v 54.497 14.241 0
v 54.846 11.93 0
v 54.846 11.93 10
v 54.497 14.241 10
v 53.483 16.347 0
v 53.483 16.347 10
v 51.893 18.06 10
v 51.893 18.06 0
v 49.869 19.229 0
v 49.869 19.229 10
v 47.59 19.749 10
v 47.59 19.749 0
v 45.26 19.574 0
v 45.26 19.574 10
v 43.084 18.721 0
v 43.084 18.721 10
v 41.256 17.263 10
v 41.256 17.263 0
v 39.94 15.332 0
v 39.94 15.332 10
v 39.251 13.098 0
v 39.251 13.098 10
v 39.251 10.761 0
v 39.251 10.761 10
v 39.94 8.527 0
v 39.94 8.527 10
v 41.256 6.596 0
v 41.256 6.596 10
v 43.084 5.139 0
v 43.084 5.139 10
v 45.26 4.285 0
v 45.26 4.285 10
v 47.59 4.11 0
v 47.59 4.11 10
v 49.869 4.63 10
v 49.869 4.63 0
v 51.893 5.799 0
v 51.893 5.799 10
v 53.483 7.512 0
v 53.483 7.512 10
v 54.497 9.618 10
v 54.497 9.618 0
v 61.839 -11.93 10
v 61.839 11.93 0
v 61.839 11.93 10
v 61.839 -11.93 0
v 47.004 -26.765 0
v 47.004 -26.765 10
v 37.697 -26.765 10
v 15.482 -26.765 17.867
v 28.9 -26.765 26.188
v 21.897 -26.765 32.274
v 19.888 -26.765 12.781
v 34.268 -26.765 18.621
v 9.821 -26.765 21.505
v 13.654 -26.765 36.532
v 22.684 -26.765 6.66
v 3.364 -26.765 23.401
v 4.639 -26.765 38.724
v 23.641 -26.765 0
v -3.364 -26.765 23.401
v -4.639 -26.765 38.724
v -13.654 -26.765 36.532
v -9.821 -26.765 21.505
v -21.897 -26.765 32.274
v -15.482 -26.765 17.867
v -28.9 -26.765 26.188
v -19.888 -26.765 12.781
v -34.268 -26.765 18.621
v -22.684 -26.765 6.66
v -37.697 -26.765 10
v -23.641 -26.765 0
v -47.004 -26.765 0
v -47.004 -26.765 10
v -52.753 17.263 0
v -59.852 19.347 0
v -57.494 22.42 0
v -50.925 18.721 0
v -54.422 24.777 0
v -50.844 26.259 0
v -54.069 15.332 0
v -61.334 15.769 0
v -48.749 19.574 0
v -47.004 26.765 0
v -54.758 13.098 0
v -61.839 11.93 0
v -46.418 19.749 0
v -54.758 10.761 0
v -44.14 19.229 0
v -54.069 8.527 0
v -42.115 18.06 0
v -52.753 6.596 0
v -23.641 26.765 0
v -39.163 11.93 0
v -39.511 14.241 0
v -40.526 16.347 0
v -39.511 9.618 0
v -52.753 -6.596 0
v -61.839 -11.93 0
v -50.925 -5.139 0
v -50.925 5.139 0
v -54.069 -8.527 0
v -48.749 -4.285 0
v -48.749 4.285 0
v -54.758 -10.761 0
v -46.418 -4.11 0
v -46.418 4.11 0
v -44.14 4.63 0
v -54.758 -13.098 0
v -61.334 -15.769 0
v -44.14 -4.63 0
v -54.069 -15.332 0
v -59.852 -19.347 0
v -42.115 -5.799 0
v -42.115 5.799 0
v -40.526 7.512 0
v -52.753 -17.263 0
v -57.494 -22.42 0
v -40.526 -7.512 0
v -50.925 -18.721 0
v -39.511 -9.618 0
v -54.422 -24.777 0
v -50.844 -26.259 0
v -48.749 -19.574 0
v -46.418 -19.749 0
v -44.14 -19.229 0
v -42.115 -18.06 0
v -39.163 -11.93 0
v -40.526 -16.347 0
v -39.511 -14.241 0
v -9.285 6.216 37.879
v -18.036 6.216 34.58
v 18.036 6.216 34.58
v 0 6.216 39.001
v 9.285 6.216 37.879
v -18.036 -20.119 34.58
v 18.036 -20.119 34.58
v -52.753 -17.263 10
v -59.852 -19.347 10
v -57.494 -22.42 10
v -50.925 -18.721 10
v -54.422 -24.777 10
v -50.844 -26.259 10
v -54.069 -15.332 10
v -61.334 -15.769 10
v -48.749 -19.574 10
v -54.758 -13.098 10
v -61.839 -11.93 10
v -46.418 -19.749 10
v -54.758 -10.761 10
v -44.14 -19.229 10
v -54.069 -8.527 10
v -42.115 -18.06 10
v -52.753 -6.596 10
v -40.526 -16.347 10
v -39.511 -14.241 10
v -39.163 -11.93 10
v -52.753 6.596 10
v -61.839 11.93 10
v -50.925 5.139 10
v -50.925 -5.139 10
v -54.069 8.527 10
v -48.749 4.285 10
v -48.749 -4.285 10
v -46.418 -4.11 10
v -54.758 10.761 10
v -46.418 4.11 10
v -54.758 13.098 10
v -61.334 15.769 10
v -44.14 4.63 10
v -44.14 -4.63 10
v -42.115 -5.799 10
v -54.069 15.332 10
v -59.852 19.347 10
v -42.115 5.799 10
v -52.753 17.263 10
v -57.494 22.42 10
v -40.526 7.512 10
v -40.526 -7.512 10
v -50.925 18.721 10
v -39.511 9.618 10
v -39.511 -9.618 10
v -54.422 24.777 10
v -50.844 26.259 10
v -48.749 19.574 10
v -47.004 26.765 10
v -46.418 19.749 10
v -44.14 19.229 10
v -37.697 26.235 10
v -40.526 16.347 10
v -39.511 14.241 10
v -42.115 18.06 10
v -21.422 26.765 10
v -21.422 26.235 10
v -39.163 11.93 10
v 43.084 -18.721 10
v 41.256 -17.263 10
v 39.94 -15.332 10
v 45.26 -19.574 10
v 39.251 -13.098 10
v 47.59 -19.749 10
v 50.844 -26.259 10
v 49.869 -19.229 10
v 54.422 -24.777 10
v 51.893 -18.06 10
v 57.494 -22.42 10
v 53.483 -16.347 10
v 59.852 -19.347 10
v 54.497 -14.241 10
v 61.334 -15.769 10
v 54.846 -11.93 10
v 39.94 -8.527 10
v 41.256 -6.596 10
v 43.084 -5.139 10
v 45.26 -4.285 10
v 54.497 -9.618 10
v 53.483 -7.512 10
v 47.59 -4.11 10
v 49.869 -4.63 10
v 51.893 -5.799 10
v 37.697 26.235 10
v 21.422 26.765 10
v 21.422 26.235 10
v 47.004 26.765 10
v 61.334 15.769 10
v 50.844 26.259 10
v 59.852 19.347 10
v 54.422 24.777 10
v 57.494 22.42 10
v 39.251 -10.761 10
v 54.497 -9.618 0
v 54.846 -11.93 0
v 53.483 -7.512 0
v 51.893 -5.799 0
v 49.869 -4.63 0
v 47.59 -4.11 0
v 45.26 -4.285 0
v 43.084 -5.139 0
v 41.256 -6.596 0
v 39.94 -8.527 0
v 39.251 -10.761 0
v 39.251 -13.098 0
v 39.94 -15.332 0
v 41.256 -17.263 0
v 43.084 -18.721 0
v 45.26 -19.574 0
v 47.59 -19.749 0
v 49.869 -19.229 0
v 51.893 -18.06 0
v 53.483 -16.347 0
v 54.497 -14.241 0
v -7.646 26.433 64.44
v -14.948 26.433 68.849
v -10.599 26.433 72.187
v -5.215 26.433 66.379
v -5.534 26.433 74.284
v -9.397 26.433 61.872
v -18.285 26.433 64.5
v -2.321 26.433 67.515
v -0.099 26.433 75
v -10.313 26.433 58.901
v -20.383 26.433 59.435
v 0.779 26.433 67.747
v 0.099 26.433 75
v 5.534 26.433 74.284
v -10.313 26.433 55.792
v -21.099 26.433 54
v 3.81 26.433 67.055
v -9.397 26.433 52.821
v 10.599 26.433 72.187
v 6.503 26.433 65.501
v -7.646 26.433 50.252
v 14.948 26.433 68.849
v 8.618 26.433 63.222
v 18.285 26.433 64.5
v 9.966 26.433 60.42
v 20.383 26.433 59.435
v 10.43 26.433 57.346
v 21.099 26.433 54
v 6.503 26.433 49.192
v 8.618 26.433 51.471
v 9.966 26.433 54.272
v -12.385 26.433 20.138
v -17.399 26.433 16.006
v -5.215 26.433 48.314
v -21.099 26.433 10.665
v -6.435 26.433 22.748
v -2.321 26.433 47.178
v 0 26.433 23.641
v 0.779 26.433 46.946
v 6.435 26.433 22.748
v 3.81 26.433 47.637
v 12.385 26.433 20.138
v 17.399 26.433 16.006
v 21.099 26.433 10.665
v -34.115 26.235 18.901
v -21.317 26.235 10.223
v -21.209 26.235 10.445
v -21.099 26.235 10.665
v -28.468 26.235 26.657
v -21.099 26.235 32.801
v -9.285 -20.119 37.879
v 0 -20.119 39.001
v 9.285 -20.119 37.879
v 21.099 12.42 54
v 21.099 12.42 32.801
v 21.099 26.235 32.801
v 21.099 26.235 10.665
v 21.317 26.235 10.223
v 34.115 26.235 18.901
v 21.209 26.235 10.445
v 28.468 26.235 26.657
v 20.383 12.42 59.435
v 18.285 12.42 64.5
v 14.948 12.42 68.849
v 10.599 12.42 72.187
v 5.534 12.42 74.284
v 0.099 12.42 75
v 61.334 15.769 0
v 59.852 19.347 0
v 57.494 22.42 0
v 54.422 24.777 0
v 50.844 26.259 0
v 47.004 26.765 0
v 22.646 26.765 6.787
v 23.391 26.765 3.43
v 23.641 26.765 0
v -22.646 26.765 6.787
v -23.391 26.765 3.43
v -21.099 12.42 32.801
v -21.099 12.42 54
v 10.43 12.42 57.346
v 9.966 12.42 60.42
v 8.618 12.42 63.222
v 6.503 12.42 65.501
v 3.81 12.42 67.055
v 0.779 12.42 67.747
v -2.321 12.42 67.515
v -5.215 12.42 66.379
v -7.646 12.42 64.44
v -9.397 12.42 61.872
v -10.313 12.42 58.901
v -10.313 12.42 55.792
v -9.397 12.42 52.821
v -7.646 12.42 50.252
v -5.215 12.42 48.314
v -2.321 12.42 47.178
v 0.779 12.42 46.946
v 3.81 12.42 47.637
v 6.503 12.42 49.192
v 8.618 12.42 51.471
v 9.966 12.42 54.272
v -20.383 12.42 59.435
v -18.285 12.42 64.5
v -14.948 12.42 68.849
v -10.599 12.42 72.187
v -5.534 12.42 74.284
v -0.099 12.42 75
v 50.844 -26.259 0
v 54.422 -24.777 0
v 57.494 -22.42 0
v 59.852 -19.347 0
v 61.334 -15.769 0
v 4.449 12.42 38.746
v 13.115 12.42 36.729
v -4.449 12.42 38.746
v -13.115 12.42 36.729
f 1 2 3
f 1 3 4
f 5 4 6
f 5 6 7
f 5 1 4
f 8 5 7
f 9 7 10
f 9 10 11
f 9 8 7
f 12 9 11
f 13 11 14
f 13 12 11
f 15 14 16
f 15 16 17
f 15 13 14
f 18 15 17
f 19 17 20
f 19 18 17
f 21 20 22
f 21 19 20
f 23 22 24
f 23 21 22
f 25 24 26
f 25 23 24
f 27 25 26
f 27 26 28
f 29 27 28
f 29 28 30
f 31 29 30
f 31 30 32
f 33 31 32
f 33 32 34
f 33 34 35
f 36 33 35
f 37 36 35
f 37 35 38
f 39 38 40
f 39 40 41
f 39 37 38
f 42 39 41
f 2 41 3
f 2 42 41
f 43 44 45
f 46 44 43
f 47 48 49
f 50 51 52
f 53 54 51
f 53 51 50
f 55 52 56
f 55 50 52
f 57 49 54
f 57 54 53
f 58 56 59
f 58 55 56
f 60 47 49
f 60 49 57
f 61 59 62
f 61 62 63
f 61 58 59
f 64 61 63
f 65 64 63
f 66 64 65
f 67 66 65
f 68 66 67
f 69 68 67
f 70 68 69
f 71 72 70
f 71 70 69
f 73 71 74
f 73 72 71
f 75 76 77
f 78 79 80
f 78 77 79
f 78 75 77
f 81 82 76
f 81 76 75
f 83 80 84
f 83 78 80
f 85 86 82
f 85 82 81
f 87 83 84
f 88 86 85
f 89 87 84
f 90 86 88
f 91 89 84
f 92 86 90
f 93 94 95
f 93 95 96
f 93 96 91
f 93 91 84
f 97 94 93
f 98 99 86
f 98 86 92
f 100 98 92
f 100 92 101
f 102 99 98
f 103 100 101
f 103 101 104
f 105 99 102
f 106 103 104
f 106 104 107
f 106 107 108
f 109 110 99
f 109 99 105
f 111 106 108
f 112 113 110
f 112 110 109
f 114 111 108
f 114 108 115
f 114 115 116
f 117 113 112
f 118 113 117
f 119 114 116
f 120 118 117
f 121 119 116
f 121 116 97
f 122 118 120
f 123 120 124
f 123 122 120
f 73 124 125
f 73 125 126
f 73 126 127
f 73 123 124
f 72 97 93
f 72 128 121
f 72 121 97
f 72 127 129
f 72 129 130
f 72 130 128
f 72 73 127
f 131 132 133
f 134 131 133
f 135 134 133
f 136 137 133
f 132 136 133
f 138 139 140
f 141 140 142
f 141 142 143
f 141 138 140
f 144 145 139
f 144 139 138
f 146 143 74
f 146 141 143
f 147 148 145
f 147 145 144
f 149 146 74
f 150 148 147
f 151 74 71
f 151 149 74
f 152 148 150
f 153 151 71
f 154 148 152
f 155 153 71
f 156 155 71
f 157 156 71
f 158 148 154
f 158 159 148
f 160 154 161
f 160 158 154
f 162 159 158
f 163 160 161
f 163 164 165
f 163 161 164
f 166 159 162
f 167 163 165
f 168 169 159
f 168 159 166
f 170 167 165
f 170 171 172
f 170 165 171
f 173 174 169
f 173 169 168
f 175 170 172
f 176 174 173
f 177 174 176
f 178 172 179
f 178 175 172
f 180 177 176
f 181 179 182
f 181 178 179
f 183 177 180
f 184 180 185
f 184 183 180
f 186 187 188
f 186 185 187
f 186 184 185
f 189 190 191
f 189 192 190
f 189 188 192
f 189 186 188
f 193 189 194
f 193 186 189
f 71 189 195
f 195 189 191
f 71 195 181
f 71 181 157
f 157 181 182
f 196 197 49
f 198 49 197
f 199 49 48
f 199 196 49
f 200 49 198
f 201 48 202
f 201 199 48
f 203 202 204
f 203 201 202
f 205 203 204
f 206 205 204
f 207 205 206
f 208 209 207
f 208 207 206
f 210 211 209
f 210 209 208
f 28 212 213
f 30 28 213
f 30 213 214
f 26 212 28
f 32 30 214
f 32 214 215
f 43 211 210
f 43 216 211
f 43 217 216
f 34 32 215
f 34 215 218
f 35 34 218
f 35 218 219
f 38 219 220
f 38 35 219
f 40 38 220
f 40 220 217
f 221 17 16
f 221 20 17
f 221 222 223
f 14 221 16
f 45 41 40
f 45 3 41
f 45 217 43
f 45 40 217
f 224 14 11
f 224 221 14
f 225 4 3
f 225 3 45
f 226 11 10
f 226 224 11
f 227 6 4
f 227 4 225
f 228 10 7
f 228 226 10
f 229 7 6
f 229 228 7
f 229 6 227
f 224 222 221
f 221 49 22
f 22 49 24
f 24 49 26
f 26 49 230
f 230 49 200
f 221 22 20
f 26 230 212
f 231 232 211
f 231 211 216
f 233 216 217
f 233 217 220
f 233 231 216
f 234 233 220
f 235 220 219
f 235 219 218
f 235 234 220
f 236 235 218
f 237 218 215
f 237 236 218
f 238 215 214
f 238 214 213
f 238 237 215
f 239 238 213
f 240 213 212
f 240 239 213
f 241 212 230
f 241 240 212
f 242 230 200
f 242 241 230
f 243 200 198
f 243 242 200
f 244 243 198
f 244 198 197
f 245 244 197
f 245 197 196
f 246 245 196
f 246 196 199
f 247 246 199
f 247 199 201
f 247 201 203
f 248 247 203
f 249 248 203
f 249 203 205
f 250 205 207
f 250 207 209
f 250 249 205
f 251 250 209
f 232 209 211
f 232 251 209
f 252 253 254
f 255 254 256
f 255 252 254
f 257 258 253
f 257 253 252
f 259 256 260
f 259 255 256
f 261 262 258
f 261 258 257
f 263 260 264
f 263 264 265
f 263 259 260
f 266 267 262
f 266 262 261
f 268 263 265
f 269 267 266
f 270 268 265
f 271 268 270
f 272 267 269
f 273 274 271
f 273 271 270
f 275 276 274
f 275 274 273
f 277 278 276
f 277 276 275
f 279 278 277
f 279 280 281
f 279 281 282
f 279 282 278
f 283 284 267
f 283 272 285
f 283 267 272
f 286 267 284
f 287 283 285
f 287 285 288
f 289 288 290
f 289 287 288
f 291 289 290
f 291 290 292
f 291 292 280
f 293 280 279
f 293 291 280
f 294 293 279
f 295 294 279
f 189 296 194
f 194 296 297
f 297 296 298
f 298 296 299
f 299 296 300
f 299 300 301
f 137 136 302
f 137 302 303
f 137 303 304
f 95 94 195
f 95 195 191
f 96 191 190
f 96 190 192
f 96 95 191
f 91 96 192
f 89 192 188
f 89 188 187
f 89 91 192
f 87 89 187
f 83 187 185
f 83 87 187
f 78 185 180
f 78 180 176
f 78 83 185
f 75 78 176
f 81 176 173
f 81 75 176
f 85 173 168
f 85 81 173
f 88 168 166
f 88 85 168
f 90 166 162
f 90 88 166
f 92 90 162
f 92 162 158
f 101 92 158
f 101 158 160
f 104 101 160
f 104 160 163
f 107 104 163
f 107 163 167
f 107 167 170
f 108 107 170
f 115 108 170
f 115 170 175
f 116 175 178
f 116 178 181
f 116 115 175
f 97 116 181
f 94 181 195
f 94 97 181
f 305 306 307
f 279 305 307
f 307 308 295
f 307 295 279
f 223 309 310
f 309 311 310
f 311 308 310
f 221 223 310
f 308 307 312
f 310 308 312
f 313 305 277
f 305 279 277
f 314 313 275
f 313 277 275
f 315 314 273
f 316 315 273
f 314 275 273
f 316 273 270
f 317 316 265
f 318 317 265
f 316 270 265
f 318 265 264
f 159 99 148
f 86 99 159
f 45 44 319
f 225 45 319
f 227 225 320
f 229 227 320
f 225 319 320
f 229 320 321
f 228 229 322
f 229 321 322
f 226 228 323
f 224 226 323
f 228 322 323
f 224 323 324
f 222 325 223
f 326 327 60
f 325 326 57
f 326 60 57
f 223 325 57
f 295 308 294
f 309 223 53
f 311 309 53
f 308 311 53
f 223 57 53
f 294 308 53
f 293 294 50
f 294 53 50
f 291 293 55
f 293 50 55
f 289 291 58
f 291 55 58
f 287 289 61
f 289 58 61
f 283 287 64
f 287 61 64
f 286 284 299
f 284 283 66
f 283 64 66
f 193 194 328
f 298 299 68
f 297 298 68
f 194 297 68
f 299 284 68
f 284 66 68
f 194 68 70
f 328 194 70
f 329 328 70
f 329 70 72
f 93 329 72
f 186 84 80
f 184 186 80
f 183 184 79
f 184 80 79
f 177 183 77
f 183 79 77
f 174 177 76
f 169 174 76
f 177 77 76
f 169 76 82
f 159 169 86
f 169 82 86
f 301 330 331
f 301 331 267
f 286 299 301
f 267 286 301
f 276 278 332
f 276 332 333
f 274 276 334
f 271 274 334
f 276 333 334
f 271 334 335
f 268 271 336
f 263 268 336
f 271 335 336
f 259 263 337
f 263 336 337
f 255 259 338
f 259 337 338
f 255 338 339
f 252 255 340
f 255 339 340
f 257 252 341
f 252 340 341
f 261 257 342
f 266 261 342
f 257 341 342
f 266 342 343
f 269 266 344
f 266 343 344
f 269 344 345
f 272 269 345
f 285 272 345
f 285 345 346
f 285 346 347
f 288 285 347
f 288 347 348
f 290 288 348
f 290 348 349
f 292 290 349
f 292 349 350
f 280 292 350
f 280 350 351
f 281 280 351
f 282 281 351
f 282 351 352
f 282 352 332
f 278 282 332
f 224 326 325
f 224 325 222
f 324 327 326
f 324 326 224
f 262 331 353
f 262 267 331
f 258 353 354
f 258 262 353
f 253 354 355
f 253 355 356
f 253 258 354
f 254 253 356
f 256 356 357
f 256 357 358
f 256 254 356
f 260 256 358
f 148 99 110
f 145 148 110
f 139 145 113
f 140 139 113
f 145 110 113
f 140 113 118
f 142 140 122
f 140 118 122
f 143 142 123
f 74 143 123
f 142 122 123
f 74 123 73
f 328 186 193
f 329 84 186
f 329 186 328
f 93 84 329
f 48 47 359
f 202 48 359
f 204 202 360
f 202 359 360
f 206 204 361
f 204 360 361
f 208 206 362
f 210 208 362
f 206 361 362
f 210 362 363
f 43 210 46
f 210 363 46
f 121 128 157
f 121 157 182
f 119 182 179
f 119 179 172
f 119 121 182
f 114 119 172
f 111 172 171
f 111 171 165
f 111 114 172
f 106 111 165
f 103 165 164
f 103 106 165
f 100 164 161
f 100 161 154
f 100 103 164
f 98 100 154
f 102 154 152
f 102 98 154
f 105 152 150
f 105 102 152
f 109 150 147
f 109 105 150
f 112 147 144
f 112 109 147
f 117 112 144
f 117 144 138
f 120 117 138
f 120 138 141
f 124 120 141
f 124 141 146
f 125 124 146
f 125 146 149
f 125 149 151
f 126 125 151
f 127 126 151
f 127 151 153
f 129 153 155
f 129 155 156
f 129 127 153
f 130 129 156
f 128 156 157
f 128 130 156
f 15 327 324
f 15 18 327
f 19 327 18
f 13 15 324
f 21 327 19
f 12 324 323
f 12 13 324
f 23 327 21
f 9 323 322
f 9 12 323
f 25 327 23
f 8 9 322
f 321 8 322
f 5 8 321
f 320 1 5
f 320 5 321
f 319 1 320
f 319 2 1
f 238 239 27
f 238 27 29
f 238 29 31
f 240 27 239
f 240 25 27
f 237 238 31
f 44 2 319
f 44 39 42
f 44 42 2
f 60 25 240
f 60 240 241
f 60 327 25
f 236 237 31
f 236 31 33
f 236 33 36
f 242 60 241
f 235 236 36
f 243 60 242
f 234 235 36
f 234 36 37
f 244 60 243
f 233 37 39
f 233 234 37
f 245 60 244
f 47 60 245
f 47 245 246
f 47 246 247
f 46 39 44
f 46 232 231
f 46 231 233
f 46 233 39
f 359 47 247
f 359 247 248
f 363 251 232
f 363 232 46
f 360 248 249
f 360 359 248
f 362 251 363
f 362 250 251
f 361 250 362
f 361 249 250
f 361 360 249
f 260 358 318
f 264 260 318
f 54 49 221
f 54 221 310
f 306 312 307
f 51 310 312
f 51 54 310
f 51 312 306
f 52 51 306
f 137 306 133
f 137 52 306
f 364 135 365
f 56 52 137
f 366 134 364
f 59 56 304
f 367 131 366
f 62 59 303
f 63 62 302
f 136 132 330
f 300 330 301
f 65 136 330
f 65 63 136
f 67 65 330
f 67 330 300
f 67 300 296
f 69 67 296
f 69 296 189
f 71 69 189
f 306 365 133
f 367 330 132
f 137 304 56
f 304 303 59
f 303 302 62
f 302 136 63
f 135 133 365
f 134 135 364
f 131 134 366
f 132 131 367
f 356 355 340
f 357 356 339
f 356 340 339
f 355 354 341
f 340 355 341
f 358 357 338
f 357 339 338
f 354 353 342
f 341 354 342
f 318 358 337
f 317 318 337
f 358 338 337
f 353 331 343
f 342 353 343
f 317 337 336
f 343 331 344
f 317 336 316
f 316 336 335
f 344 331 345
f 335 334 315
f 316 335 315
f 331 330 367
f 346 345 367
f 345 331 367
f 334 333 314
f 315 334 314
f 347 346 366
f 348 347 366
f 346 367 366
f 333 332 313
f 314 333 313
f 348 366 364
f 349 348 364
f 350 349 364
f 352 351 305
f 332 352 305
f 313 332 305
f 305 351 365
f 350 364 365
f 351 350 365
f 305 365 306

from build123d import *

# Parameters (mm, degrees)
SKETCH_R        = 7.84144
PAD_DEPTH       = 10
SKETCH001_W     = 42.19746
SKETCH001_H     = 14.012741
PAD001_DEPTH    = 65
FILLET_R        = 21
SKETCH002_R     = 10.429862
POCKET_DEPTH    = 14.345294
PAD002_DEPTH    = 53
POCKET001_DEPTH = 53.530348
SKETCH005_W     = 26.334992
SKETCH005_H     = 10.429696
POCKET002_DEPTH = 82.9392


with BuildPart() as part:
    # Sketch → Pad (new body)
    with BuildSketch(Plane.XY):
        with BuildLine():
            ThreePointArc((-47.004433, 26.764674), (-57.494388, 22.419592), (-61.83947, 11.929637))
            Line((-61.83947, -11.929637), (-61.83947, 11.929637))
            ThreePointArc((-61.83947, -11.929637), (-57.494388, -22.419592), (-47.004433, -26.764674))
            Line((47.004433, -26.764674), (-47.004433, -26.764674))
            ThreePointArc((47.004433, -26.764674), (57.494388, -22.419592), (61.83947, -11.929637))
            Line((61.83947, 11.929637), (61.83947, -11.929637))
            ThreePointArc((61.83947, 11.929637), (57.494388, 22.419592), (47.004433, 26.764674))
            Line((-47.004433, 26.764674), (47.004433, 26.764674))
        make_face()
        with Locations((-47.004433, 11.929637)):
            Circle(SKETCH_R, mode=Mode.SUBTRACT)
        with Locations((-47.004433, -11.929637)):
            Circle(SKETCH_R, mode=Mode.SUBTRACT)
        with Locations((47.004433, 11.929637)):
            Circle(SKETCH_R, mode=Mode.SUBTRACT)
        with Locations((47.004433, -11.929637)):
            Circle(SKETCH_R, mode=Mode.SUBTRACT)
    extrude(amount=PAD_DEPTH)

    # Sketch001 (on Face14 of Pad) → Pad001 (join)
    with BuildSketch(Plane.XY.offset(10)):
        with Locations((0, 19.426751)):
            Rectangle(SKETCH001_W, SKETCH001_H)
    extrude(amount=PAD001_DEPTH)

    # Fillet
    fillet_edges = [part.edges().sort_by_distance(p)[0] for p in [
        (21.09873, 19.426751, 75),
        (-21.09873, 19.426751, 75),
    ]]
    fillet(fillet_edges, radius=FILLET_R)

    # Sketch002 (on Face5 of Fillet) → Pocket (cut, through all)
    with BuildSketch(Plane.XZ.offset(-12.42038)):
        with Locations((0, 57.346222)):
            Circle(SKETCH002_R)
    extrude(amount=-POCKET_DEPTH, mode=Mode.SUBTRACT)

    # Sketch003 (on Face16 of Pocket) → Pad002 (join)
    with BuildSketch(Plane.XZ.offset(26.764674)):
        with BuildLine():
            ThreePointArc((39.000746, 0), (0, 39.000746), (-39.000746, 0))
            Line((-39.000746, 0), (39.000746, 0))
        make_face()
    extrude(amount=-PAD002_DEPTH)

    # Sketch004 (on Face24 of Pad002) → Pocket001 (cut, through all)
    with BuildSketch(Plane.XZ.offset(26.764674)):
        with BuildLine():
            ThreePointArc((23.640903, -0.107932), (0, 23.641149), (-23.640903, -0.107932))
            Line((-23.640903, -0.107932), (23.640903, -0.107932))
        make_face()
    extrude(amount=-POCKET001_DEPTH, mode=Mode.SUBTRACT)

    # Sketch005 (on DatumPlane) → Pocket002 (cut, through all)
    with BuildSketch(Plane.YZ.offset(21.09873)):
        with Locations((-6.951761, 39.794678)):
            Rectangle(SKETCH005_W, SKETCH005_H)
    extrude(amount=-POCKET002_DEPTH, mode=Mode.SUBTRACT)


solid = part.part
